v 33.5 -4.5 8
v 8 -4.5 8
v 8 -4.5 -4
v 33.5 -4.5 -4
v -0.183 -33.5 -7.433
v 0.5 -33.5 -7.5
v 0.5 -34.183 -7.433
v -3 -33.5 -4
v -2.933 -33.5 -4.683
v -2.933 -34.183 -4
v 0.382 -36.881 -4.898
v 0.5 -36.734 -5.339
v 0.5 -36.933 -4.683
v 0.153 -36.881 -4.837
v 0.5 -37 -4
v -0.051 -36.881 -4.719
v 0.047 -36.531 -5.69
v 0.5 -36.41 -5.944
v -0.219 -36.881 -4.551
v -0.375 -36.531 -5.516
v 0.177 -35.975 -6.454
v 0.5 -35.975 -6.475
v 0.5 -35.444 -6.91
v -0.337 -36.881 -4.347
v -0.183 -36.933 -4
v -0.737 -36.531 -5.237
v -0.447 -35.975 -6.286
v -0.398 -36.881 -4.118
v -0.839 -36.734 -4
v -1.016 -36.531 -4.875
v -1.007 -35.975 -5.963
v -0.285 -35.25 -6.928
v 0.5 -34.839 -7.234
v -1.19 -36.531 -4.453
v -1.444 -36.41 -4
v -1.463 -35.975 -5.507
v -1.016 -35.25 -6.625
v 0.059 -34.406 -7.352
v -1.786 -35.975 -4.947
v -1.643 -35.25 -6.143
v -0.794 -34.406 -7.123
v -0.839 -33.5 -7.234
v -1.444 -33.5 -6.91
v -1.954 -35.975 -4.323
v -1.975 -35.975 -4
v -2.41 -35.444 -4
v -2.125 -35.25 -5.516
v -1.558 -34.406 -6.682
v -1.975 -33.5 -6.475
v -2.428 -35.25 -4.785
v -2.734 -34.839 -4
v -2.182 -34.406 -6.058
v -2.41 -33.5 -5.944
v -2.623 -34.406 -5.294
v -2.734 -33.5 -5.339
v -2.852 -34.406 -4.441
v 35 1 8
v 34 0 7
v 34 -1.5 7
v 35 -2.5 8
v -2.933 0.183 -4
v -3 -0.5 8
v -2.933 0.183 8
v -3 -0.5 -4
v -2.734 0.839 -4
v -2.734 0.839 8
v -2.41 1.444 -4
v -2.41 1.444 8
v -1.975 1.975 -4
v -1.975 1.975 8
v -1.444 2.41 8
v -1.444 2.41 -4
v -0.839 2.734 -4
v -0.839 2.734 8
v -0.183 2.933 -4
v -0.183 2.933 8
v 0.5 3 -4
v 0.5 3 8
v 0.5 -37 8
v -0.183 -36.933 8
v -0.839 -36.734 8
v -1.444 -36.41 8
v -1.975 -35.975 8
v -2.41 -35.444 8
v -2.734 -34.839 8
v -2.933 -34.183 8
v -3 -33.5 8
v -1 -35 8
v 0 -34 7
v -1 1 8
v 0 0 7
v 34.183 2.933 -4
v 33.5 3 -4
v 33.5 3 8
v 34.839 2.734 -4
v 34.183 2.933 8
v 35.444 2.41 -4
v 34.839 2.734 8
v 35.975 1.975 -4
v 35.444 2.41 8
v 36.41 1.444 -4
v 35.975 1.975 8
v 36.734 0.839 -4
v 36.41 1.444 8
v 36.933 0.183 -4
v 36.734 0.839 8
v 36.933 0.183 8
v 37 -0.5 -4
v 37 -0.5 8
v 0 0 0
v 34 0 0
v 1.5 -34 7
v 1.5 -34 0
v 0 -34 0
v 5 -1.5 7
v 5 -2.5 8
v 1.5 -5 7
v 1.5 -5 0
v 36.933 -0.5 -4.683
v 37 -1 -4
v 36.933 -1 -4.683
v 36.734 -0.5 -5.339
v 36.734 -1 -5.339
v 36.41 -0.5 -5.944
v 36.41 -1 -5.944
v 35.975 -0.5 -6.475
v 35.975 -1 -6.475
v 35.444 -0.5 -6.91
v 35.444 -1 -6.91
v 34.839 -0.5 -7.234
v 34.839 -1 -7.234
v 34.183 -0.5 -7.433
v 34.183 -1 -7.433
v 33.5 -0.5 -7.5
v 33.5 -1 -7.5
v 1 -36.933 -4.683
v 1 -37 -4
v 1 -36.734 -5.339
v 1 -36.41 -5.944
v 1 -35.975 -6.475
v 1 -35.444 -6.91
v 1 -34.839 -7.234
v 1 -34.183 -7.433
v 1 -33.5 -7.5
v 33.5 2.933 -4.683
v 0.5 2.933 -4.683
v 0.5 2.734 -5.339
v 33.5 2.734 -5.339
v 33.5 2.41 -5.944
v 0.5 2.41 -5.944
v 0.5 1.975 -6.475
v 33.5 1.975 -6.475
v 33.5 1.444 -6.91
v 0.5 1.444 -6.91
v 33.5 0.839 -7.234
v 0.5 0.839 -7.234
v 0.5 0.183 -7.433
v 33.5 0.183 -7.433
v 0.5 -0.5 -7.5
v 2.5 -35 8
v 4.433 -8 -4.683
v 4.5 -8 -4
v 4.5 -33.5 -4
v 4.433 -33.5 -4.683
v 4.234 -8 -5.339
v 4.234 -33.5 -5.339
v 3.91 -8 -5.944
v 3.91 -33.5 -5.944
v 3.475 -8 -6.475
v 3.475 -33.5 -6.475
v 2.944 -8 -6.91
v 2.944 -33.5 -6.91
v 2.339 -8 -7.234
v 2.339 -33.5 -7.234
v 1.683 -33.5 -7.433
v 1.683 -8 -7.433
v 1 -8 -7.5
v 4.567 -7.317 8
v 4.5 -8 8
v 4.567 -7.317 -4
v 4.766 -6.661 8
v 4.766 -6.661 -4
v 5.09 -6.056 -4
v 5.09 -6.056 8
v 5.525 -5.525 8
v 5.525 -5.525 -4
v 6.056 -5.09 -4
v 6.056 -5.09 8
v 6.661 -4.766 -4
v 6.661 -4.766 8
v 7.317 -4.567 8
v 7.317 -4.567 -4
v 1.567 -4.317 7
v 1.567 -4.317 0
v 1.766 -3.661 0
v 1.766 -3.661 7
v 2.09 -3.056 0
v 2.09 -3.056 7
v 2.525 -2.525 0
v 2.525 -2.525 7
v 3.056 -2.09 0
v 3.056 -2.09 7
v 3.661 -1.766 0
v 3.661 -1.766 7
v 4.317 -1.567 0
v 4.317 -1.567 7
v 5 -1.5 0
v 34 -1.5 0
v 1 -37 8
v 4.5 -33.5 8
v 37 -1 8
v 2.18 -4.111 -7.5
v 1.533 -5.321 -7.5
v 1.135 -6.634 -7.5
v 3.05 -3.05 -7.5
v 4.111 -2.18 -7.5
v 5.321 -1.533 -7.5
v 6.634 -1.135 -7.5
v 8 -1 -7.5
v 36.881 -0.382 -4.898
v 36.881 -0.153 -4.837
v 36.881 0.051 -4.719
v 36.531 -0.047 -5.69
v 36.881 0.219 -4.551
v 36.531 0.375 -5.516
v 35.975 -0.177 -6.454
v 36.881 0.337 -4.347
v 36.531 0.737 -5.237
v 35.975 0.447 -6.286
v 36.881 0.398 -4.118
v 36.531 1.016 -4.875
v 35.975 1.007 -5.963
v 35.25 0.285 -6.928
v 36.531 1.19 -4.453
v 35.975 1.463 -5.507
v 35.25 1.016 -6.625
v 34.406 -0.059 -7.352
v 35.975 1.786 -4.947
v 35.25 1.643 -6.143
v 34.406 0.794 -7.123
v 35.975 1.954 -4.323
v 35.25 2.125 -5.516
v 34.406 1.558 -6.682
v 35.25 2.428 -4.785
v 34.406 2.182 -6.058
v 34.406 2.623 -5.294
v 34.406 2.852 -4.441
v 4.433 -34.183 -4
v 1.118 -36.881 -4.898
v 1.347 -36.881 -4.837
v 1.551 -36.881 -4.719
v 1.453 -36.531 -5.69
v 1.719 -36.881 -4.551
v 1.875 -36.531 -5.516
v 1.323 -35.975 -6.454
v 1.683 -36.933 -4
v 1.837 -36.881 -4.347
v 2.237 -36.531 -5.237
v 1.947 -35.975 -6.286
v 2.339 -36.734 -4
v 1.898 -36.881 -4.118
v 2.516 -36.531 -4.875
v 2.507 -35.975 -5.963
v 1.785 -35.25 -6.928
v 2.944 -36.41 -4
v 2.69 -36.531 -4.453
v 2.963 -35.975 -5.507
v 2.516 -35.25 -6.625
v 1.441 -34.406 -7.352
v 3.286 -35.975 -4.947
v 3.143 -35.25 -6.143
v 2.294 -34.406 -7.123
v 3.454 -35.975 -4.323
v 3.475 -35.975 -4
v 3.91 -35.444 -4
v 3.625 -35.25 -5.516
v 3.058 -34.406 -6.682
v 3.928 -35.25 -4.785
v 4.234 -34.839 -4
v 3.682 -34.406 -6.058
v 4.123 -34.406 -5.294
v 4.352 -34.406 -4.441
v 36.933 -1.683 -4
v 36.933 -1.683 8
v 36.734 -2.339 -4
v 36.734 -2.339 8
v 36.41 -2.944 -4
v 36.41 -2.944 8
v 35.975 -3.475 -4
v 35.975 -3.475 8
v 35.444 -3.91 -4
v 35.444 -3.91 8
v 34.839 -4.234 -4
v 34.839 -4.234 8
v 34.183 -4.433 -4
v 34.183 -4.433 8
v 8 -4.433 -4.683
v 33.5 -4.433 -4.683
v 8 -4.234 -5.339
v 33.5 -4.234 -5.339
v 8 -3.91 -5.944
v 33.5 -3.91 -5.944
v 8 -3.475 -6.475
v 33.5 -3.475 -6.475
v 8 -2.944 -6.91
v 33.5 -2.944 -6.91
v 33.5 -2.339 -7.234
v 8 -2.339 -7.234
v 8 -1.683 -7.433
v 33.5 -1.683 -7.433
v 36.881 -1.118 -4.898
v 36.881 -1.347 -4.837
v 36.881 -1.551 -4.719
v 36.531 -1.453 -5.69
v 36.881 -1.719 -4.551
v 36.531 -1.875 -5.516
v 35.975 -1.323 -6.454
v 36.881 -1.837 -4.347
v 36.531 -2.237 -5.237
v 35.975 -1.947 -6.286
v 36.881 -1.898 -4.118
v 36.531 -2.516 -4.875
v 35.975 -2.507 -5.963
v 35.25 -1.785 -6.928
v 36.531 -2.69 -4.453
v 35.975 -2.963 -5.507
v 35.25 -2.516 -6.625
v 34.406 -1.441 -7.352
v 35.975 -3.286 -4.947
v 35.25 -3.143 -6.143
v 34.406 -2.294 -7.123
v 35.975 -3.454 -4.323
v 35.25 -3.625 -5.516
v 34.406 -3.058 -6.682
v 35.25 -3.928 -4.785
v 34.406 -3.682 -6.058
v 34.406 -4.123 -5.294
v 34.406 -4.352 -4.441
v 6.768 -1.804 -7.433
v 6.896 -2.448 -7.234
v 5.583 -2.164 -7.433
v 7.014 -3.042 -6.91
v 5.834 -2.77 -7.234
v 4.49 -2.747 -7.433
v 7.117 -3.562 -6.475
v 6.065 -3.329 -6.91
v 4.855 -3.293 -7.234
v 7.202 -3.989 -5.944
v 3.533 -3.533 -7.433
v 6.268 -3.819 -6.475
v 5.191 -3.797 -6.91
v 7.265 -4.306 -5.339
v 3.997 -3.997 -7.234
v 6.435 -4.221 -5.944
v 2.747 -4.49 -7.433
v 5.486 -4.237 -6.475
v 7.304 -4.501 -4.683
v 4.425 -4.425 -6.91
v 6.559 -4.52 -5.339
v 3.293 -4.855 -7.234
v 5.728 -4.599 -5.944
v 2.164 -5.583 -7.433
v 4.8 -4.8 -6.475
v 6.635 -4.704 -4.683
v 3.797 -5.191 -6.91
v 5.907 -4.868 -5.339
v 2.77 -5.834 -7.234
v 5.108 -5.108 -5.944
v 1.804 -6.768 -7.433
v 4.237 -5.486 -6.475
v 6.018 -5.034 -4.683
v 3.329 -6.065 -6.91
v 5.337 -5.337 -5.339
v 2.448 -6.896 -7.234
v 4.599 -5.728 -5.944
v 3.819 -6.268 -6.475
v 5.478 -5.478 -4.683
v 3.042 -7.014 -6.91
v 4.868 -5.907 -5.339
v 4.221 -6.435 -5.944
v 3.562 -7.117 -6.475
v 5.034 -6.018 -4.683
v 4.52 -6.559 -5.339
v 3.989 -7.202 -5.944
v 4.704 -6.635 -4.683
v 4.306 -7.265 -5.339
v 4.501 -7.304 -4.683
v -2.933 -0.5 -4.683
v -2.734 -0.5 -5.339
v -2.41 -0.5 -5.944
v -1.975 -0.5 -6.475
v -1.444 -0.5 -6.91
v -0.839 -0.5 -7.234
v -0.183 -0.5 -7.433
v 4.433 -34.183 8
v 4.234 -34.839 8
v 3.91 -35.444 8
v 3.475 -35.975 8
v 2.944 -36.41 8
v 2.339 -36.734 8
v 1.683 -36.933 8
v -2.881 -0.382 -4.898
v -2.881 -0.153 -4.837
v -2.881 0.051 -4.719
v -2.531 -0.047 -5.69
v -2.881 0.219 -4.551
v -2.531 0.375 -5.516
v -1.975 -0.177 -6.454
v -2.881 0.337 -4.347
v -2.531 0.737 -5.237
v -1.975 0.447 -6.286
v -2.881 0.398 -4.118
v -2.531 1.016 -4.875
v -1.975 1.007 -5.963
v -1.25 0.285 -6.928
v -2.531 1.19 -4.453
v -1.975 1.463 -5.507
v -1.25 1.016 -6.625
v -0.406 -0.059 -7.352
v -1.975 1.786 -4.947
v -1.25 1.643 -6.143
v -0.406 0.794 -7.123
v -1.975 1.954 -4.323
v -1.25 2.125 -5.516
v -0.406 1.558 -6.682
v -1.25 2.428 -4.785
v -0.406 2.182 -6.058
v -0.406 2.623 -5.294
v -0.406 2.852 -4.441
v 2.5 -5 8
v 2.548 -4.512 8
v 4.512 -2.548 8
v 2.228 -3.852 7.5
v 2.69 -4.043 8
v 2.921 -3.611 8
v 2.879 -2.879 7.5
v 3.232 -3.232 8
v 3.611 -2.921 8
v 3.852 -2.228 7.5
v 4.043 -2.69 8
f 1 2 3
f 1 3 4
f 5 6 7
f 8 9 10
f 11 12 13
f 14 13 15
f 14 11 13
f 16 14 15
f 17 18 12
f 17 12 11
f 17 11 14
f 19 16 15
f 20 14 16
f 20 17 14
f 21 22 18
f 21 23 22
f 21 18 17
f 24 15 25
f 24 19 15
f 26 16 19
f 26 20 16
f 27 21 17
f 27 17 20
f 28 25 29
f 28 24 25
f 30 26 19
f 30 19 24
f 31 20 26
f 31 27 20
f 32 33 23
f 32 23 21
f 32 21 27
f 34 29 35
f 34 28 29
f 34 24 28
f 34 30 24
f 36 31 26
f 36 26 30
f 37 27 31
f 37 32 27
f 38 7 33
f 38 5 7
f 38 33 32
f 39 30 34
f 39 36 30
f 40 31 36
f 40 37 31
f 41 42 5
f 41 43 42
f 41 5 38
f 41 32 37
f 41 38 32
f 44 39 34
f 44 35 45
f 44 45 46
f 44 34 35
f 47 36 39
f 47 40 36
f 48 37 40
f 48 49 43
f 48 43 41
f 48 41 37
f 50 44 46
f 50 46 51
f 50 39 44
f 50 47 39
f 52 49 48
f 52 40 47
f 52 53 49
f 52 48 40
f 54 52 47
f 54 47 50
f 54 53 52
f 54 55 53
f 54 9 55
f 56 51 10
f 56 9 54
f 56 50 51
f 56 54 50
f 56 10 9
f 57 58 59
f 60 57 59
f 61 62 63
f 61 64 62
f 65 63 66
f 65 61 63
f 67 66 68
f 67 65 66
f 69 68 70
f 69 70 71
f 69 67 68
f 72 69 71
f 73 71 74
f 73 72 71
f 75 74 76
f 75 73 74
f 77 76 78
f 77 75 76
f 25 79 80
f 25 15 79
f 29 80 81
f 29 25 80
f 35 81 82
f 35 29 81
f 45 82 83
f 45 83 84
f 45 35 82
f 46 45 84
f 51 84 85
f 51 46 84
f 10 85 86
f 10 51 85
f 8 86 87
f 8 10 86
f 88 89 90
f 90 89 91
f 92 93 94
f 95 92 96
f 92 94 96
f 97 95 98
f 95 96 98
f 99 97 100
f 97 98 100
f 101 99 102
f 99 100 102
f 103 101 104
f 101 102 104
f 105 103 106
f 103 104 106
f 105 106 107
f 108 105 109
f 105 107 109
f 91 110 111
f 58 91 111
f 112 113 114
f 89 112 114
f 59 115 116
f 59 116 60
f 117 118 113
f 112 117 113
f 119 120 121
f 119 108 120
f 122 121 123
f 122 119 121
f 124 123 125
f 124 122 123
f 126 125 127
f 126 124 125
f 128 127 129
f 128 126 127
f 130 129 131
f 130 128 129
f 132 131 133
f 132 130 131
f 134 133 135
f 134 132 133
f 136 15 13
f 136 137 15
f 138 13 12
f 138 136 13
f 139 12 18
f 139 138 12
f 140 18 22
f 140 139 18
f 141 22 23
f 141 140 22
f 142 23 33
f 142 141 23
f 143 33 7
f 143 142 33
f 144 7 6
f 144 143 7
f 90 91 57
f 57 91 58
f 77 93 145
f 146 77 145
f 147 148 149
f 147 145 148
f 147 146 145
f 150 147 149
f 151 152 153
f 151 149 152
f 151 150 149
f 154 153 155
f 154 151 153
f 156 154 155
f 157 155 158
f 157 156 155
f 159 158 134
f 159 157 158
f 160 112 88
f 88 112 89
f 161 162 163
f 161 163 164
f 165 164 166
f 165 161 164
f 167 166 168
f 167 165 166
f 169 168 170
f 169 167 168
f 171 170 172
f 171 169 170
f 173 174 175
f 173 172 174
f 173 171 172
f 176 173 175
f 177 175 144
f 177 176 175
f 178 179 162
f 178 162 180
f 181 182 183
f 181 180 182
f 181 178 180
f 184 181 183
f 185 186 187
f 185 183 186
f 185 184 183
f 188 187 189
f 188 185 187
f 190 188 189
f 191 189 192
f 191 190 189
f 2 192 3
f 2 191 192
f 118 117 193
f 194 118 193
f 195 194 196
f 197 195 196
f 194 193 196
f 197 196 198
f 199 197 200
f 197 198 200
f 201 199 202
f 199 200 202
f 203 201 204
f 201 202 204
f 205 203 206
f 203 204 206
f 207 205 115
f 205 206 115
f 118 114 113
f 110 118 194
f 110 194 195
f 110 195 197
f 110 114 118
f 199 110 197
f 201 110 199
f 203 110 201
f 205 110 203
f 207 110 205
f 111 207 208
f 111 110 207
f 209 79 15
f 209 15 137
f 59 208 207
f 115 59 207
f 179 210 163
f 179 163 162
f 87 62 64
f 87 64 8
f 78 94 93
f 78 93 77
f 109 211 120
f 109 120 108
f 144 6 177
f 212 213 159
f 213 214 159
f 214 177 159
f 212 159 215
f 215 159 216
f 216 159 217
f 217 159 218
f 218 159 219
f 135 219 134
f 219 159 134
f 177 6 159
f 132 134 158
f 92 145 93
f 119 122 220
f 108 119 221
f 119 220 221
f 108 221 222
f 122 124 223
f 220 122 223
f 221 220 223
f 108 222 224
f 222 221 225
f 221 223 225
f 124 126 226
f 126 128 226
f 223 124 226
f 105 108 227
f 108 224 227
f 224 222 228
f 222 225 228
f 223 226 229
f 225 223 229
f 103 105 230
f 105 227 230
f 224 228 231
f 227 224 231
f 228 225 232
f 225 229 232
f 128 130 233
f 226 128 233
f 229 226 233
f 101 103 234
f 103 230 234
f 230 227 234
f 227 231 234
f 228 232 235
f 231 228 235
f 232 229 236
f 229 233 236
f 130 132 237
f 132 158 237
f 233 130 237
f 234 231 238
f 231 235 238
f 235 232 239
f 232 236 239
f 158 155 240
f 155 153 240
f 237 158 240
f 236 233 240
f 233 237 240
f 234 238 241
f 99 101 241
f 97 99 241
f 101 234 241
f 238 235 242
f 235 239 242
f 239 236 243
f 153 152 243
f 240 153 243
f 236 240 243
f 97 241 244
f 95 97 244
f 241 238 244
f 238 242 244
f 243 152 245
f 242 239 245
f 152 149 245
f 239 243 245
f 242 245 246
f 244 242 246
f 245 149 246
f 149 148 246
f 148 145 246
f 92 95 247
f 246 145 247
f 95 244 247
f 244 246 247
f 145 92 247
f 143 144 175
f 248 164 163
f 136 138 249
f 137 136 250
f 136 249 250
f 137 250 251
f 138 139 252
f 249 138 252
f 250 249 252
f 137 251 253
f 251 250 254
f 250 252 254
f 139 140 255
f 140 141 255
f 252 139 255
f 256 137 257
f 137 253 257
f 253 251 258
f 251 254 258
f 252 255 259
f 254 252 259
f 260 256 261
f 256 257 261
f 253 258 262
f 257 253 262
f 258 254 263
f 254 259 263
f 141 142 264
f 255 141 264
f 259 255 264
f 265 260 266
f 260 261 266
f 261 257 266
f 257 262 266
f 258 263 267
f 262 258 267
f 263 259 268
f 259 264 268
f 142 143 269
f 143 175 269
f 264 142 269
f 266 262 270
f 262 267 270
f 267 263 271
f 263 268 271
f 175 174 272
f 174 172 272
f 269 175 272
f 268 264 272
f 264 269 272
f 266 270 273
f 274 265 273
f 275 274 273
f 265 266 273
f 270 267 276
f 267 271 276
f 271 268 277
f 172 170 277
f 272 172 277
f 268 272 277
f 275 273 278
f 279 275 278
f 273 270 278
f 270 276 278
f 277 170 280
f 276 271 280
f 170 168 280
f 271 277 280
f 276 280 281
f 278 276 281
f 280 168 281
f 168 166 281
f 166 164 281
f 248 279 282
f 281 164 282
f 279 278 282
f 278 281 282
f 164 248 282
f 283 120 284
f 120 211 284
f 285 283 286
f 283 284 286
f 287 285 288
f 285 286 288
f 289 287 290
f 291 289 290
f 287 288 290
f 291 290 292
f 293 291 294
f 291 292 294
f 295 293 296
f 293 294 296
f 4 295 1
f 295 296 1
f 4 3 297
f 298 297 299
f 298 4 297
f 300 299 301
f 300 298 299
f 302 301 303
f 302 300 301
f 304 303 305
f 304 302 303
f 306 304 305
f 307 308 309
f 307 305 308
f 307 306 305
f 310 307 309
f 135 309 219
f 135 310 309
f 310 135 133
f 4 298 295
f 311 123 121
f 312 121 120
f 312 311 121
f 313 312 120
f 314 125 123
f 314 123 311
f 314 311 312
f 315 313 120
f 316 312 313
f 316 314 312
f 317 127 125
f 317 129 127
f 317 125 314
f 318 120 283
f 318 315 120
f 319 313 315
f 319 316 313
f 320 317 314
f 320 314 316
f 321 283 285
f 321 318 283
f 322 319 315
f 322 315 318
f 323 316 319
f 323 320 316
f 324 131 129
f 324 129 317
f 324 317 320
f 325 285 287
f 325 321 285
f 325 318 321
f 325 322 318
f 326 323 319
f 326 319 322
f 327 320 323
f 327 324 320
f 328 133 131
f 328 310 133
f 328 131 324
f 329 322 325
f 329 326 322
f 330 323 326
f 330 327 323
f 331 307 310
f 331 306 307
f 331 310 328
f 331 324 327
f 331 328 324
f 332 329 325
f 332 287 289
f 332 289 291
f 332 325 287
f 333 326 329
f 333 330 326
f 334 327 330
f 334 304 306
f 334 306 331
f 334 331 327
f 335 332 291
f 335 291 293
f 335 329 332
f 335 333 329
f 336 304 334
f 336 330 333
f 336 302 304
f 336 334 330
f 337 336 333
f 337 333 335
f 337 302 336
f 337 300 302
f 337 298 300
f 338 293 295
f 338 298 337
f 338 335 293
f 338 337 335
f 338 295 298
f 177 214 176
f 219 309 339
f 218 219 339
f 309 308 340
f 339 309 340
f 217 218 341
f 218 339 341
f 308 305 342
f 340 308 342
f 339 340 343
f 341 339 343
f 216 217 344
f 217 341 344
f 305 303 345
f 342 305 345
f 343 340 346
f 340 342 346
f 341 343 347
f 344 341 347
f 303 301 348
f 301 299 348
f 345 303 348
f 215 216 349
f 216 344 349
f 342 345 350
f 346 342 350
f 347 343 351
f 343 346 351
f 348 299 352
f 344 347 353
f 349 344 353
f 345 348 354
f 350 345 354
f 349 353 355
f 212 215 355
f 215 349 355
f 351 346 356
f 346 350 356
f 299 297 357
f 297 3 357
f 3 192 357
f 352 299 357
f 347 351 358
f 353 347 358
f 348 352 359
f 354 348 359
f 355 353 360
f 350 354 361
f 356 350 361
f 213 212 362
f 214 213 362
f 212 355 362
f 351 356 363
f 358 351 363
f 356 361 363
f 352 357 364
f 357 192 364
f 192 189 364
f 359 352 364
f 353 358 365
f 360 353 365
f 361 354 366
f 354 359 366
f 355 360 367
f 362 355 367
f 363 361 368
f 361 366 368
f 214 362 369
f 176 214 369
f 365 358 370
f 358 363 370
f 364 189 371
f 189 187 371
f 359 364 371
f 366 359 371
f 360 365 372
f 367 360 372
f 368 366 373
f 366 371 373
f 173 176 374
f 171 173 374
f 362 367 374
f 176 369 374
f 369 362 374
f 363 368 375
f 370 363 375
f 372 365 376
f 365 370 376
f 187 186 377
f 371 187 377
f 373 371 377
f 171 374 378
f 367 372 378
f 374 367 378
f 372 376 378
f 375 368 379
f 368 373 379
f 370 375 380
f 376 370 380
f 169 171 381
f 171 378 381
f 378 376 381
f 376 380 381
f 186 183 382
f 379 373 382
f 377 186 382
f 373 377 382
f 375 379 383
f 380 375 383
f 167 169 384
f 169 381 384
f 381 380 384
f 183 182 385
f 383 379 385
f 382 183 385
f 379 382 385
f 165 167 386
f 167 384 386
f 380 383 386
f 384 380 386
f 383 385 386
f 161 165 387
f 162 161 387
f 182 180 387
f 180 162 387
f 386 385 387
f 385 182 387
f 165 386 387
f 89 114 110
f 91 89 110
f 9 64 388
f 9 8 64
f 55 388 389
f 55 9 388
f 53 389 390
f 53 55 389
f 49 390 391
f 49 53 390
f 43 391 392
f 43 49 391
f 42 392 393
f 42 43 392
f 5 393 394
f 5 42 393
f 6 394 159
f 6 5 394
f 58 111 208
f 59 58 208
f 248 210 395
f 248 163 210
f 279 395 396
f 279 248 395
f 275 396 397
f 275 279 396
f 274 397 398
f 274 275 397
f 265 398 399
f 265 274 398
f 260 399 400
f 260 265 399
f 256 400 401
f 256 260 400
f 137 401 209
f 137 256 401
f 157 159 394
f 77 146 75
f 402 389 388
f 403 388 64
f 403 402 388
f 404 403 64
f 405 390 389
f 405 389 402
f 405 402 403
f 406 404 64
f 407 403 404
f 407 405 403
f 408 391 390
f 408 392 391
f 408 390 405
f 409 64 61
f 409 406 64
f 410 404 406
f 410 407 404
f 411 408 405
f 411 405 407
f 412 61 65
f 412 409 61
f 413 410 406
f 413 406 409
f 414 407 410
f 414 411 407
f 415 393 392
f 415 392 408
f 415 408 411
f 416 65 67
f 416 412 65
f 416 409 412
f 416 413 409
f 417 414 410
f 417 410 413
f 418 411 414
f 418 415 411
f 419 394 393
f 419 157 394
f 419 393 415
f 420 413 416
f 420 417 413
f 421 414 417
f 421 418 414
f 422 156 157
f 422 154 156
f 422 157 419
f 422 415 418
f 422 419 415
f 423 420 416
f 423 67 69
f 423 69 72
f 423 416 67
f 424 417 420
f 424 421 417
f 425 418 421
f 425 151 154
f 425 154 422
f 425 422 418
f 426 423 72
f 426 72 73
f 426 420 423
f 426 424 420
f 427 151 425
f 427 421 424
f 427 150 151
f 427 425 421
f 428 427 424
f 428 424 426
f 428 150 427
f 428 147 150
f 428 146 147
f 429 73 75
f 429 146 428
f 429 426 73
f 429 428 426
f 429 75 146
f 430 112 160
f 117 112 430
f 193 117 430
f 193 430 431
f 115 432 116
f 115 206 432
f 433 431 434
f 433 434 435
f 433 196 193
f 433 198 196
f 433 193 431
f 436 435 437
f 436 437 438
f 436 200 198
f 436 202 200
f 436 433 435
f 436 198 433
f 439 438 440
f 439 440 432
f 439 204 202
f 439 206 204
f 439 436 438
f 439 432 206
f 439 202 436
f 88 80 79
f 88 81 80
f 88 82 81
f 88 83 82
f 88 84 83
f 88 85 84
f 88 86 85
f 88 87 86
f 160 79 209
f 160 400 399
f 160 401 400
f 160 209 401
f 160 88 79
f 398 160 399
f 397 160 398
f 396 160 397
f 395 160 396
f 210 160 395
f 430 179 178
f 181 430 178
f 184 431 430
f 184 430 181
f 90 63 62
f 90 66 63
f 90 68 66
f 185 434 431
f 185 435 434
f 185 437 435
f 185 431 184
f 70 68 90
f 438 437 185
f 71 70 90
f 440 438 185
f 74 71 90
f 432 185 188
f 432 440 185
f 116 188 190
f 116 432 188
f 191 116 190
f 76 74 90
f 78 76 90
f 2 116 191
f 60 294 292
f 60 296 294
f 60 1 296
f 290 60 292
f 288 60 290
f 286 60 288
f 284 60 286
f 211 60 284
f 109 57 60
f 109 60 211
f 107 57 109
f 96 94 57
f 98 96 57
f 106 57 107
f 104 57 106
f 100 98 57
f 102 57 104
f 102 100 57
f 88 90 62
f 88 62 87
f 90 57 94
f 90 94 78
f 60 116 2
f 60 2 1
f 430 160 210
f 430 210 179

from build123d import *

# Parameters (mm, degrees)
F1_DEPTH = 8
F2_DEPTH = 7.5
F3_R     = 3.5
F4_SIZE  = 1


with BuildPart() as f1:
    # F0 (on Top) → F1 (new body)
    with BuildSketch(Plane.XY):
        Polygon((4.5, -37), (4.5, -4.5), (37, -4.5), (37, 3), (-3, 3), (-3, -37), align=None)
        Polygon((34, -1.5), (1.5, -1.5), (1.5, -34), (0, -34), (0, -1.5), (0, 0), (1.5, 0), (34, 0), align=None, mode=Mode.SUBTRACT)
    extrude(amount=F1_DEPTH)

    # F0 (on Top) → F2 (join)
    with BuildSketch(Plane.XY):
        Polygon((4.5, -37), (4.5, -4.5), (37, -4.5), (37, 3), (-3, 3), (-3, -37), align=None)
        Polygon((34, -1.5), (1.5, -1.5), (1.5, -34), (0, -34), (0, -1.5), (0, 0), (1.5, 0), (34, 0), align=None, mode=Mode.SUBTRACT)
        Polygon((1.5, -34), (1.5, -1.5), (34, -1.5), (34, 0), (1.5, 0), (0, 0), (0, -1.5), (0, -34), align=None)
    extrude(amount=-F2_DEPTH)

    # F3
    f3_edges = [f1.edges().sort_by_distance(p)[0] for p in [
        (20.75, -4.5, -7.5),
        (4.5, -20.75, -7.5),
        (17, 3, -7.5),
        (-3, -17, -7.5),
        (4.5, -4.5, 0.25),
        (-3, 3, 0.25),
        (0.75, -37, -7.5),
        (37, -0.75, -7.5),
        (4.5, -37, 0.25),
        (-3, -37, 0.25),
        (37, -4.5, 0.25),
        (37, 3, 0.25),
        (1.5, -1.5, 4),
    ]]
    fillet(f3_edges, radius=F3_R)

    # F4
    f4_edges = [f1.edges().sort_by_distance(p)[0] for p in [
        (0, -17, 8),
        (2.525126, -2.525126, 8),
        (17, 0, 8),
        (0.75, -34, 8),
        (34, -0.75, 8),
    ]]
    chamfer(f4_edges, length=F4_SIZE)


solid = f1.part
